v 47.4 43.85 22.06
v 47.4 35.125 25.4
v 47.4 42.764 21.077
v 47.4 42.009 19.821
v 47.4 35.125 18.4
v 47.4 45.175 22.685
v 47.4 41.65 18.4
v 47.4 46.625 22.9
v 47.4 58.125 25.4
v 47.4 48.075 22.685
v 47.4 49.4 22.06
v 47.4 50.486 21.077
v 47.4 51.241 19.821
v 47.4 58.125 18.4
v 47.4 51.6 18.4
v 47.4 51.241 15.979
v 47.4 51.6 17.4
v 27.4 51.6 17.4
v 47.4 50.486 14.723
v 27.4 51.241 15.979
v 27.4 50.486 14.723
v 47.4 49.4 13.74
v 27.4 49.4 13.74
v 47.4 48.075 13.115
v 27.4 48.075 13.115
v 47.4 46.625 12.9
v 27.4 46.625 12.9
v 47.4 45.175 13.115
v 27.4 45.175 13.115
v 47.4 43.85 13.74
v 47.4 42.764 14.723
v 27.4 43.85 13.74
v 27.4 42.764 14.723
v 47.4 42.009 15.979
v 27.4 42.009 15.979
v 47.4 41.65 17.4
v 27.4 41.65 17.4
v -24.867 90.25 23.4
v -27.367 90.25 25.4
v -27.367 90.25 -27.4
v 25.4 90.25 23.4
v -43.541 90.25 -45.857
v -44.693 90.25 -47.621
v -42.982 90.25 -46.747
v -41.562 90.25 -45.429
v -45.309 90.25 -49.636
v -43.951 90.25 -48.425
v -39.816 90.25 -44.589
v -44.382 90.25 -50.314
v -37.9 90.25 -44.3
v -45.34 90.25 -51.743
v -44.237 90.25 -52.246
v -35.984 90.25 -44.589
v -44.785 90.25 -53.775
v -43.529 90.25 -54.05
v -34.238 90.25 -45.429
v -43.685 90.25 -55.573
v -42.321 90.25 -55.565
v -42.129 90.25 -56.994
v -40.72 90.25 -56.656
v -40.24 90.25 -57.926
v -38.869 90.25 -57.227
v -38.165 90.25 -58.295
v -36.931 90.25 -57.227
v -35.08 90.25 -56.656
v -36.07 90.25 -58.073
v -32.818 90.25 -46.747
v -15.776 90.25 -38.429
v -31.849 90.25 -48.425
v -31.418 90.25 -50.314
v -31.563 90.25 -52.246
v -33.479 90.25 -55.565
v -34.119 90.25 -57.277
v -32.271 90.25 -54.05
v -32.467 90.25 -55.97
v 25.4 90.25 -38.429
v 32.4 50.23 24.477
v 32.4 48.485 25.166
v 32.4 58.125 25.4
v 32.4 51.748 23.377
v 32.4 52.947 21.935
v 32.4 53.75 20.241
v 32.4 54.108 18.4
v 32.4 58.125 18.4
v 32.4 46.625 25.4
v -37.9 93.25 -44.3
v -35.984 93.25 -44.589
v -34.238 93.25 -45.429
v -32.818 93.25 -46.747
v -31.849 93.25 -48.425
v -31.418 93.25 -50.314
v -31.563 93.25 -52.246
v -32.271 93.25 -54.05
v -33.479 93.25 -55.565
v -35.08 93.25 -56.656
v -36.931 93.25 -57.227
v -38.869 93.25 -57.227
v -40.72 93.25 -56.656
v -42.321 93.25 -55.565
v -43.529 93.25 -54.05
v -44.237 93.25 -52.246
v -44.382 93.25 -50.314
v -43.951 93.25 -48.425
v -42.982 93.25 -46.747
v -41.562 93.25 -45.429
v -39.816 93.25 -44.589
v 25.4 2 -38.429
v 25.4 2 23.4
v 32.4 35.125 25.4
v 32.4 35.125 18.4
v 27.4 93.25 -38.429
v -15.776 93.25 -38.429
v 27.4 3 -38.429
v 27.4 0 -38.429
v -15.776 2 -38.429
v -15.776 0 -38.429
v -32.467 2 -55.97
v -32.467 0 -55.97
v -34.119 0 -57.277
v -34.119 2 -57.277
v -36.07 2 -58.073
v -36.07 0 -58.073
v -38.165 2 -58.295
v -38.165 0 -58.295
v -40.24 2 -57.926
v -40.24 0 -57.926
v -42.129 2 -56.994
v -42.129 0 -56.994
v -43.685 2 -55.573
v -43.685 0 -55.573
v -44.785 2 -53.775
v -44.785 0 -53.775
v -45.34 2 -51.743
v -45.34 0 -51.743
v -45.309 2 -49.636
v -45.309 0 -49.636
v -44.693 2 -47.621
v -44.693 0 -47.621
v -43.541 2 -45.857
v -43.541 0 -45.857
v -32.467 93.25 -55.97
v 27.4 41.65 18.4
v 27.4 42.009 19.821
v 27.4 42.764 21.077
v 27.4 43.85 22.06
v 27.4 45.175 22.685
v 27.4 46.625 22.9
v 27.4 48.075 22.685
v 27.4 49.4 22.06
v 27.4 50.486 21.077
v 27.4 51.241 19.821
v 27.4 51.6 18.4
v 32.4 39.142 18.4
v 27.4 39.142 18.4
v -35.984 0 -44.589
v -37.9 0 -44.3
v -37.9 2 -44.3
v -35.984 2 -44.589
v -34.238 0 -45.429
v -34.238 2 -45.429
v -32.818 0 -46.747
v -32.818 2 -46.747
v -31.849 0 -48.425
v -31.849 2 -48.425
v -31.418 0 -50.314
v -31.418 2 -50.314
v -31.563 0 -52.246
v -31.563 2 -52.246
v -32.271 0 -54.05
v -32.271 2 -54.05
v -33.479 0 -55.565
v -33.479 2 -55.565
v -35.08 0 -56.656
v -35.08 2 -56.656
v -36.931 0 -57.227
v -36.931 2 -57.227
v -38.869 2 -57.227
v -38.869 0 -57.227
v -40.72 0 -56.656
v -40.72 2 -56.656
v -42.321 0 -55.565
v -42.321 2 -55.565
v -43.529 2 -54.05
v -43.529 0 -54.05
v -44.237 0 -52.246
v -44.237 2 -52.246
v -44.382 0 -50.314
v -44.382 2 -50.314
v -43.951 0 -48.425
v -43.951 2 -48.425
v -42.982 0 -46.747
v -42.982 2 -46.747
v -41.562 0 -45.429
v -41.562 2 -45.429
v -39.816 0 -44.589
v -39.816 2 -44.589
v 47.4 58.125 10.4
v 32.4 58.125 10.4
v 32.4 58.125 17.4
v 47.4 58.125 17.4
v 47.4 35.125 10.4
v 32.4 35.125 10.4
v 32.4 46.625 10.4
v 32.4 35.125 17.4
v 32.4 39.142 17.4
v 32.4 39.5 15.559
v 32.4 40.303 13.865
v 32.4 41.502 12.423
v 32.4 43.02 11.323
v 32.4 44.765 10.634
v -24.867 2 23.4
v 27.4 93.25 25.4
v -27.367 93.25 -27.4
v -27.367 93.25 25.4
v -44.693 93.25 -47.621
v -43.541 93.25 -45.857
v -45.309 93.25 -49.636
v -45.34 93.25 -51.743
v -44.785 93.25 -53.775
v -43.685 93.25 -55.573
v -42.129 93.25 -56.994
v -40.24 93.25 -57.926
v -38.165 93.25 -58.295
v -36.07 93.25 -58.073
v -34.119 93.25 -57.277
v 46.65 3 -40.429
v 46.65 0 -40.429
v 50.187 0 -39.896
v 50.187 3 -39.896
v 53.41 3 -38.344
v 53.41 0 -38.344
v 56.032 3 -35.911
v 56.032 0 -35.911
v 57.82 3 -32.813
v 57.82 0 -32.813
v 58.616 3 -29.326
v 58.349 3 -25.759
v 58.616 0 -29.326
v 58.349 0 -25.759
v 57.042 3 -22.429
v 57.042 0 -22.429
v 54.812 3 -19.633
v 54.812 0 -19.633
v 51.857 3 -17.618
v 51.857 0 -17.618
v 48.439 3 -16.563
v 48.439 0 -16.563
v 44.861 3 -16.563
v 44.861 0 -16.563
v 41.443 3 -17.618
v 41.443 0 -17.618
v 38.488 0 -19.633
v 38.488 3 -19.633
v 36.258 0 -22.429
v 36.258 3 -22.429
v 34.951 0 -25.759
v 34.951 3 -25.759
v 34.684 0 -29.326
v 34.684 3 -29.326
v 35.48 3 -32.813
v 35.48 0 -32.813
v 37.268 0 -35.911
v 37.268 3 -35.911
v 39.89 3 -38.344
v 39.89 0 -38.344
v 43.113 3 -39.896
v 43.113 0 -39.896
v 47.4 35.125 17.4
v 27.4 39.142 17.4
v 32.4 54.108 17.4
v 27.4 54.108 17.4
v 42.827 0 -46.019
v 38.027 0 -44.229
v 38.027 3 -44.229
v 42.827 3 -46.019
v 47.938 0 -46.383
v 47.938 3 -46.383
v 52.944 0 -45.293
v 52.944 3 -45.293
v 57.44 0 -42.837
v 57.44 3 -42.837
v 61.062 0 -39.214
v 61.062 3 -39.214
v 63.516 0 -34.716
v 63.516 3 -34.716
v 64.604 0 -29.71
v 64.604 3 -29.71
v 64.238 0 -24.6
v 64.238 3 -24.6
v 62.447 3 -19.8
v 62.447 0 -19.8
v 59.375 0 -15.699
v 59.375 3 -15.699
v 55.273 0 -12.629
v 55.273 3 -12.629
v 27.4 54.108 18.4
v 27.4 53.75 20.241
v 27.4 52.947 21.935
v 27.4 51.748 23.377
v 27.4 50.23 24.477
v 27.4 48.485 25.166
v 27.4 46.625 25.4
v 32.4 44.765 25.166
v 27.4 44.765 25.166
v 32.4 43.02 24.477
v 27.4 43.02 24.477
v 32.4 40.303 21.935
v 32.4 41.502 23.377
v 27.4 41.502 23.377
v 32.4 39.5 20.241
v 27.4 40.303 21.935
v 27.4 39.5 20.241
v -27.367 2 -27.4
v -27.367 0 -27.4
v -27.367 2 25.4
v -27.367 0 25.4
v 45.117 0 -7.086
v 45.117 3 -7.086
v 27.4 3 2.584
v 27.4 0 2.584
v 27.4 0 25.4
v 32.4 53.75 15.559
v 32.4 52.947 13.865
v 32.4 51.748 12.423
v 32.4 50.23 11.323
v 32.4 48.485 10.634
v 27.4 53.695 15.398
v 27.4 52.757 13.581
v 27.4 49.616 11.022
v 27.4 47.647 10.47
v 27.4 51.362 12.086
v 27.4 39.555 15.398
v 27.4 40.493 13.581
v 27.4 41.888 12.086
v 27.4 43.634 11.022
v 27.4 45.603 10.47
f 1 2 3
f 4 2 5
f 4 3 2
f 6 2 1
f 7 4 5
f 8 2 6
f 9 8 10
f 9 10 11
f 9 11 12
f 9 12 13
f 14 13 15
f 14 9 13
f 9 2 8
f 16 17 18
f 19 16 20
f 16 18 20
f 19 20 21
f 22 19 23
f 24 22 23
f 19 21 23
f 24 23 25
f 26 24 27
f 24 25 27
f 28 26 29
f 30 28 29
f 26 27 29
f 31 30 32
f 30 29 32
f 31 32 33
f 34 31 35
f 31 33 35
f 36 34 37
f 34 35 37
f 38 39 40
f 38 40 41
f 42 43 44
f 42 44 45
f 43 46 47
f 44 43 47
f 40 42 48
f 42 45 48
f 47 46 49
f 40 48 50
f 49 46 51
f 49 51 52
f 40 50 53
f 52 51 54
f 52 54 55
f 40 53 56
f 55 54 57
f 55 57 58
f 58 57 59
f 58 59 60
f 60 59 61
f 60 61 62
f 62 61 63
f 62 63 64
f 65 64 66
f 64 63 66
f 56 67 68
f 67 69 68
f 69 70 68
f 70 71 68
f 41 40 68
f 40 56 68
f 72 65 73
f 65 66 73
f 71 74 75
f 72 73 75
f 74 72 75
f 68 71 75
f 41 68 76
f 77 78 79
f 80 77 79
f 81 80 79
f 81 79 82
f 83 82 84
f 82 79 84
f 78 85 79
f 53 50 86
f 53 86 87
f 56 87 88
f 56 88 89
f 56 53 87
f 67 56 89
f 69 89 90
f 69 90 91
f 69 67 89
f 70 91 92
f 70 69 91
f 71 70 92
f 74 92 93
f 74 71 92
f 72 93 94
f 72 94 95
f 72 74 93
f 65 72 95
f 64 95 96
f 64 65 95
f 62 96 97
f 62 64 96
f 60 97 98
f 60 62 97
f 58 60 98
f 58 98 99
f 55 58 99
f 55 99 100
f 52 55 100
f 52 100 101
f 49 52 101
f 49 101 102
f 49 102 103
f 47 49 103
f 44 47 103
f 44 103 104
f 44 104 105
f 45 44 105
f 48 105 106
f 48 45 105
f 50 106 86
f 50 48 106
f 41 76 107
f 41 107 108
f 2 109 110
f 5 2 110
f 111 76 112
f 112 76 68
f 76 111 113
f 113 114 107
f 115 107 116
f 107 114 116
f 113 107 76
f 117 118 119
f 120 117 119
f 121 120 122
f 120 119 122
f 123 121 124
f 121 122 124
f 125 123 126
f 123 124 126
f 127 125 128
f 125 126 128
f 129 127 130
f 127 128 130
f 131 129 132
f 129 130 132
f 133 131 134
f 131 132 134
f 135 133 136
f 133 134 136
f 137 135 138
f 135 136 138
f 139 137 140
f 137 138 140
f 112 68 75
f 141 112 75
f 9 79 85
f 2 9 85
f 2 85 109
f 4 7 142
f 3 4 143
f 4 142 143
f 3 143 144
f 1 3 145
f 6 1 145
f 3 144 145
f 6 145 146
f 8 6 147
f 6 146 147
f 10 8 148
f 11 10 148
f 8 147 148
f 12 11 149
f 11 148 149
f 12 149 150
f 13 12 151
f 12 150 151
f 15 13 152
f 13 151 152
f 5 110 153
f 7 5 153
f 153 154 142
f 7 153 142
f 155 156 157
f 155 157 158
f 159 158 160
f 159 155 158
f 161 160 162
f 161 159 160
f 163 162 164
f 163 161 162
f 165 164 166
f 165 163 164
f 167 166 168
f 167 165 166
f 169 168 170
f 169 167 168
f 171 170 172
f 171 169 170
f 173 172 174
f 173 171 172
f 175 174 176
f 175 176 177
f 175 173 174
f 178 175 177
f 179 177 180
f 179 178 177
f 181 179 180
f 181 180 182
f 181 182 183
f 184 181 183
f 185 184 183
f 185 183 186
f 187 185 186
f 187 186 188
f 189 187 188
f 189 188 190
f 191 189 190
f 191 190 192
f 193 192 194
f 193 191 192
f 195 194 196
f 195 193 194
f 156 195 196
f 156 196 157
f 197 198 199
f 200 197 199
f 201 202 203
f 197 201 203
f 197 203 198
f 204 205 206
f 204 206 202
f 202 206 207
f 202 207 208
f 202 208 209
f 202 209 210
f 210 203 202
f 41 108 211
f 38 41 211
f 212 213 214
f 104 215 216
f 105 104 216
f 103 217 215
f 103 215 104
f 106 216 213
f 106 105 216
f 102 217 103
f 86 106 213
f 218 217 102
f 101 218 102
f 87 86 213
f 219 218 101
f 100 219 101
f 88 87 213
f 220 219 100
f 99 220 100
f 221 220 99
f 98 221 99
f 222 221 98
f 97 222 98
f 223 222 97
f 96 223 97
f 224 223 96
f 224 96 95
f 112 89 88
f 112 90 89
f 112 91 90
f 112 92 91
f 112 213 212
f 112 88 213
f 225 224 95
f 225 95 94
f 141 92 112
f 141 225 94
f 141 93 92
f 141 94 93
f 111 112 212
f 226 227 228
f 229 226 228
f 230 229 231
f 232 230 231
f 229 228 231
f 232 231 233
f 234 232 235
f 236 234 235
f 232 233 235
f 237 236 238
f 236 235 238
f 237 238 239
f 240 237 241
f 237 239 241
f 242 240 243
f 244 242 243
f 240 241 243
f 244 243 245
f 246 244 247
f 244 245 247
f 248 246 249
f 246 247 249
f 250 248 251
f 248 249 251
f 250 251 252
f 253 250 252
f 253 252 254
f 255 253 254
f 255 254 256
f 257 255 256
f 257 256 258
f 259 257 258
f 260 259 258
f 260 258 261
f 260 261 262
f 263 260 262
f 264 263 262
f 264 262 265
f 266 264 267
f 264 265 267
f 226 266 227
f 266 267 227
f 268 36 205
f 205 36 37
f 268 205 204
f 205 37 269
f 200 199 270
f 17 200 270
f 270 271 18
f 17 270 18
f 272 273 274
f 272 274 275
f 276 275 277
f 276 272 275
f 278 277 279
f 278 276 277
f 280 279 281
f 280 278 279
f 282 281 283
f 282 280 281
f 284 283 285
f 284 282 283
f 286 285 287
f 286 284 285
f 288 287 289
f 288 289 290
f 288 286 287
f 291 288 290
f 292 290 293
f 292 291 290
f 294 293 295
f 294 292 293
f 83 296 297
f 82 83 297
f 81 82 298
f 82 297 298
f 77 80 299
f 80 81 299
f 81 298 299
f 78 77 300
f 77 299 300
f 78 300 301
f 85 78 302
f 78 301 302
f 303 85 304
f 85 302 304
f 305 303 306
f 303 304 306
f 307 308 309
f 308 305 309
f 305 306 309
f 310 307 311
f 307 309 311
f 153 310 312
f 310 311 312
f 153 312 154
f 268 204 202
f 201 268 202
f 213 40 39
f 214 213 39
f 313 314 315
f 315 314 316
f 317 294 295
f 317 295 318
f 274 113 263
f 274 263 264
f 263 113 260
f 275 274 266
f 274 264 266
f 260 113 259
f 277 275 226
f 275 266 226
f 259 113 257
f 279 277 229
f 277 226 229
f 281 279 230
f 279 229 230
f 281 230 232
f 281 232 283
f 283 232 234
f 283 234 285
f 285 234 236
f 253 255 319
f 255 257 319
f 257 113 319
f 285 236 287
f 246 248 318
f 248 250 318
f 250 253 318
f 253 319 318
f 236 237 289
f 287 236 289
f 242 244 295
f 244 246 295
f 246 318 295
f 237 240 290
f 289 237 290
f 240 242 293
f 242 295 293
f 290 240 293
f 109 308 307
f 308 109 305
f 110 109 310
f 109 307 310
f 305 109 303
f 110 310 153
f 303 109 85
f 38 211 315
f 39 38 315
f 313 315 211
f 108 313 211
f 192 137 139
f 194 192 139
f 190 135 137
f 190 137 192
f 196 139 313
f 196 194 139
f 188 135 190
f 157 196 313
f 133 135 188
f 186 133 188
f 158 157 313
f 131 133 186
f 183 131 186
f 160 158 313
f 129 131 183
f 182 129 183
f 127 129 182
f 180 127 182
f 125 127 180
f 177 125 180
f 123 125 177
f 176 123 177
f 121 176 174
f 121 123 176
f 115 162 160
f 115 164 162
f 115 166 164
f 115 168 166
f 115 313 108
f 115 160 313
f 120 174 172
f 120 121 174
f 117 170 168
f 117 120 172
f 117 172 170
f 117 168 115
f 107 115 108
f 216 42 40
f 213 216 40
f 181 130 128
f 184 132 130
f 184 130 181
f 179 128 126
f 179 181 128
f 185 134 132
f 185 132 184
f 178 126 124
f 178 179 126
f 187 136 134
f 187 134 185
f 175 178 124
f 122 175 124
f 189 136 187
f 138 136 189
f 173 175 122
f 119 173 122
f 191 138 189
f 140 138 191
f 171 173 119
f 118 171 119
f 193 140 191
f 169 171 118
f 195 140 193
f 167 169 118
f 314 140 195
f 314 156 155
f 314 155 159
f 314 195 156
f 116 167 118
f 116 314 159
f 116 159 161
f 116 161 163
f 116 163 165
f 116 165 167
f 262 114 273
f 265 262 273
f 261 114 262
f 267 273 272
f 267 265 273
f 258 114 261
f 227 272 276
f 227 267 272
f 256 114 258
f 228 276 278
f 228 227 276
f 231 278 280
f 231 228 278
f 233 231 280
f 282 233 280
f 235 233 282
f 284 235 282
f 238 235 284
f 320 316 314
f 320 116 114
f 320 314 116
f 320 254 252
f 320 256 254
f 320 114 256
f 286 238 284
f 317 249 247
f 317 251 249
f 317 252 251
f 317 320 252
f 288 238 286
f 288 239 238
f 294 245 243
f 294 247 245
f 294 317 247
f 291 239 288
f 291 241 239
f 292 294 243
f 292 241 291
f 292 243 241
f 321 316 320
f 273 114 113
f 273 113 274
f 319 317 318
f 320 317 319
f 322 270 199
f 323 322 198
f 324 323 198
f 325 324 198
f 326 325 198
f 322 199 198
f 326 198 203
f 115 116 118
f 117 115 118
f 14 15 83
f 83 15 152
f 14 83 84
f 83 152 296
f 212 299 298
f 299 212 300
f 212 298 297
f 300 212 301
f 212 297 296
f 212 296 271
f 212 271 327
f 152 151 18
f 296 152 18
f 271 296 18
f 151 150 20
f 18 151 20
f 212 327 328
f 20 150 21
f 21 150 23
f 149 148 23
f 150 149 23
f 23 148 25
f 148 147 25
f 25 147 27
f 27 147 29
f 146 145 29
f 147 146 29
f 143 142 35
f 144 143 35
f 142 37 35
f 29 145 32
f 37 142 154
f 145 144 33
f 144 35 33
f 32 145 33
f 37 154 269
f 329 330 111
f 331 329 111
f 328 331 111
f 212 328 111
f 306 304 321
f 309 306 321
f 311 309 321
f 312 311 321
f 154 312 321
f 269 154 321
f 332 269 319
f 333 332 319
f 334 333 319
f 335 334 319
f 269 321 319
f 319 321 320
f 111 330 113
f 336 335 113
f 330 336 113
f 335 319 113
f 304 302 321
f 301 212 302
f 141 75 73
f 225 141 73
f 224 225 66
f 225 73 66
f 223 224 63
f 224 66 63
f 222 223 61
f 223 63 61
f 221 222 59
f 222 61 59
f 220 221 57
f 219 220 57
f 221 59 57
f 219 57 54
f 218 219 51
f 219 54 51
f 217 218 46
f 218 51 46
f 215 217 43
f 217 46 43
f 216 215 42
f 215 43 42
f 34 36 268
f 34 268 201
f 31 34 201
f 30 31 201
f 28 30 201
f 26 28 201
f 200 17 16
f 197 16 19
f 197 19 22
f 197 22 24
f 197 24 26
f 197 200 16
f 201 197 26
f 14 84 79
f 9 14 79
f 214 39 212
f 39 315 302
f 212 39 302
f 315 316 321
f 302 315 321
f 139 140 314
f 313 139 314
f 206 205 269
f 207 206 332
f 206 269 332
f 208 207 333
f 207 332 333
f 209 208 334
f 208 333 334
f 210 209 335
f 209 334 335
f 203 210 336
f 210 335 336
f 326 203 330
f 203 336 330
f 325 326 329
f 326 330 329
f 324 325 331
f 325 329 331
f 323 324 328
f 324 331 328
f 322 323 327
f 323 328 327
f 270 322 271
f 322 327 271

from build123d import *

# Parameters (mm, degrees)
SKETCH2_R           = 6.5
BOSS_EXTRUDE1_DEPTH = 2
BOSS_EXTRUDE2_DEPTH = 90.25
BOSS_EXTRUDE3_START = 90.25
SKETCH2_4_R         = 6.5
BOSS_EXTRUDE3_DEPTH = 3
BOSS_EXTRUDE4_DEPTH = 20
BOSS_EXTRUDE5_START = 5
BOSS_EXTRUDE5_DEPTH = 15
SKETCH4_R           = 18
SKETCH4_R_2         = 12
BOSS_EXTRUDE6_DEPTH = 3


with BuildPart() as part:
    # Sketch2 → Boss-Extrude1 (new body)
    with BuildSketch(Plane(origin=(0, 0, 0), x_dir=(1, 0, 0), z_dir=(0, 1, 0))):
        with BuildLine():
            Line((-43.540750747, 45.85713332), (-27.367167941, 27.4))
            Line((-27.367167941, 27.4), (-27.367167941, -25.4))
            Line((-27.367167941, -25.4), (27.4, -25.4))
            Line((27.4, -25.4), (27.4, 38.429357381))
            Line((27.4, 38.429357381), (-15.776081894, 38.429357381))
            Line((-15.776081894, 38.429357381), (-32.466678415, 55.970011272))
            ThreePointArc((-32.466678415, 55.970011272), (-42.957502529, 56.338200806), (-43.540750747, 45.85713332))
        make_face()
        with Locations(Location((-37.9, 50.8, 0), (0, 0, 270))):
            Circle(SKETCH2_R, mode=Mode.SUBTRACT)
    extrude(amount=BOSS_EXTRUDE1_DEPTH)

    # Sketch2<3> → Boss-Extrude2 (add)
    with BuildSketch(Plane(origin=(0, 0, 0), x_dir=(1, 0, 0), z_dir=(0, 1, 0))):
        Polygon((-24.867167941, -23.4), (-27.367167941, -25.4), (27.4, -25.4), (27.4, 38.429357381), (25.4, 38.429357381), (25.4, -23.4), align=None)
    extrude(amount=BOSS_EXTRUDE2_DEPTH)

    # Sketch2<4> → Boss-Extrude3 (add)
    with BuildSketch(Plane(origin=(0, 0, 0), x_dir=(1, 0, 0), z_dir=(0, 1, 0)).offset(BOSS_EXTRUDE3_START)):
        with BuildLine():
            Line((-43.540750747, 45.85713332), (-27.367167941, 27.4))
            Line((-27.367167941, 27.4), (-27.367167941, -25.4))
            Line((-27.367167941, -25.4), (27.4, -25.4))
            Line((27.4, -25.4), (27.4, 38.429357381))
            Line((27.4, 38.429357381), (-15.776081894, 38.429357381))
            Line((-15.776081894, 38.429357381), (-32.466678415, 55.970011272))
            ThreePointArc((-32.466678415, 55.970011272), (-42.957502529, 56.338200806), (-43.540750747, 45.85713332))
        make_face()
        with Locations(Location((-37.9, 50.8, 0), (0, 0, 270))):
            Circle(SKETCH2_4_R, mode=Mode.SUBTRACT)
    extrude(amount=BOSS_EXTRUDE3_DEPTH)

    # Sketch3 → Boss-Extrude4 (add)
    with BuildSketch(Plane(origin=(27.4, 0, 0), x_dir=(0, 0, -1), z_dir=(1, 0, 0))):
        with BuildLine():
            ThreePointArc((-18.4, 41.650062814), (-22.9, 46.625), (-18.4, 51.599937186))
            Line((-18.4, 51.599937186), (-18.4, 54.108314774))
            ThreePointArc((-18.4, 54.108314774), (-25.4, 46.625), (-18.4, 39.141685226))
            Line((-18.4, 39.141685226), (-18.4, 41.650062814))
        make_face()
        with BuildLine():
            Line((-17.4, 54.108314774), (-17.4, 51.599937186))
            ThreePointArc((-17.4, 51.599937186), (-12.9, 46.625), (-17.4, 41.650062814))
            Line((-17.4, 41.650062814), (-17.4, 39.141685226))
            ThreePointArc((-17.4, 39.141685226), (-10.4, 46.625), (-17.4, 54.108314774))
        make_face()
    extrude(amount=BOSS_EXTRUDE4_DEPTH)

    # Sketch3<3> → Boss-Extrude5 (add)
    with BuildSketch(Plane(origin=(27.4, 0, 0), x_dir=(0, 0, -1), z_dir=(1, 0, 0)).offset(BOSS_EXTRUDE5_START)):
        with BuildLine():
            ThreePointArc((-25.4, 46.625), (-23.377225575, 51.748475383), (-18.4, 54.108314774))
            Line((-18.4, 54.108314774), (-18.4, 58.125))
            Line((-18.4, 58.125), (-25.4, 58.125))
            Line((-25.4, 58.125), (-25.4, 46.625))
        make_face()
        with BuildLine():
            Line((-17.4, 58.125), (-17.4, 54.108314774))
            ThreePointArc((-17.4, 54.108314774), (-12.422774425, 51.748475383), (-10.4, 46.625))
            Line((-10.4, 46.625), (-10.4, 58.125))
            Line((-10.4, 58.125), (-17.4, 58.125))
        make_face()
        with BuildLine():
            ThreePointArc((-18.4, 39.141685226), (-23.377225575, 41.501524617), (-25.4, 46.625))
            Line((-25.4, 46.625), (-25.4, 35.125))
            Line((-25.4, 35.125), (-18.4, 35.125))
            Line((-18.4, 35.125), (-18.4, 39.141685226))
        make_face()
        with BuildLine():
            Line((-10.4, 35.125), (-10.4, 46.625))
            ThreePointArc((-10.4, 46.625), (-12.422774425, 41.501524617), (-17.4, 39.141685226))
            Line((-17.4, 39.141685226), (-17.4, 35.125))
            Line((-17.4, 35.125), (-10.4, 35.125))
        make_face()
    extrude(amount=BOSS_EXTRUDE5_DEPTH)

    # Sketch4 → Boss-Extrude6 (add)
    # profile 1 of 3: a face of its own
    with BuildSketch(Plane.XZ):
        with Locations((46.65, -28.429357381)):
            Circle(SKETCH4_R)
        with Locations(Location((46.65, -28.429357381, 0), (0, 0, 270))):
            Circle(SKETCH4_R_2, mode=Mode.SUBTRACT)
    # profile 2 of 3: a face of its own
    with BuildSketch(Plane.XZ):
        with BuildLine():
            Line((27.4, -17.315364699), (27.4, -38.429357381))
            Line((27.4, -38.429357381), (38.026563161, -44.229241465))
            ThreePointArc((38.026563161, -44.229241465), (30.850115916, -19.805920542), (55.273436839, -12.629473297))
            Line((55.273436839, -12.629473297), (45.117240383, -7.086311195))
            Line((45.117240383, -7.086311195), (27.4, -17.315364699))
        make_face()
    # profile 3 of 3: a face of its own
    with BuildSketch(Plane.XZ):
        Polygon((27.4, 2.583601736), (27.4, -17.315364699), (45.117240383, -7.086311195), align=None)
    extrude(amount=-BOSS_EXTRUDE6_DEPTH)


solid = part.part
